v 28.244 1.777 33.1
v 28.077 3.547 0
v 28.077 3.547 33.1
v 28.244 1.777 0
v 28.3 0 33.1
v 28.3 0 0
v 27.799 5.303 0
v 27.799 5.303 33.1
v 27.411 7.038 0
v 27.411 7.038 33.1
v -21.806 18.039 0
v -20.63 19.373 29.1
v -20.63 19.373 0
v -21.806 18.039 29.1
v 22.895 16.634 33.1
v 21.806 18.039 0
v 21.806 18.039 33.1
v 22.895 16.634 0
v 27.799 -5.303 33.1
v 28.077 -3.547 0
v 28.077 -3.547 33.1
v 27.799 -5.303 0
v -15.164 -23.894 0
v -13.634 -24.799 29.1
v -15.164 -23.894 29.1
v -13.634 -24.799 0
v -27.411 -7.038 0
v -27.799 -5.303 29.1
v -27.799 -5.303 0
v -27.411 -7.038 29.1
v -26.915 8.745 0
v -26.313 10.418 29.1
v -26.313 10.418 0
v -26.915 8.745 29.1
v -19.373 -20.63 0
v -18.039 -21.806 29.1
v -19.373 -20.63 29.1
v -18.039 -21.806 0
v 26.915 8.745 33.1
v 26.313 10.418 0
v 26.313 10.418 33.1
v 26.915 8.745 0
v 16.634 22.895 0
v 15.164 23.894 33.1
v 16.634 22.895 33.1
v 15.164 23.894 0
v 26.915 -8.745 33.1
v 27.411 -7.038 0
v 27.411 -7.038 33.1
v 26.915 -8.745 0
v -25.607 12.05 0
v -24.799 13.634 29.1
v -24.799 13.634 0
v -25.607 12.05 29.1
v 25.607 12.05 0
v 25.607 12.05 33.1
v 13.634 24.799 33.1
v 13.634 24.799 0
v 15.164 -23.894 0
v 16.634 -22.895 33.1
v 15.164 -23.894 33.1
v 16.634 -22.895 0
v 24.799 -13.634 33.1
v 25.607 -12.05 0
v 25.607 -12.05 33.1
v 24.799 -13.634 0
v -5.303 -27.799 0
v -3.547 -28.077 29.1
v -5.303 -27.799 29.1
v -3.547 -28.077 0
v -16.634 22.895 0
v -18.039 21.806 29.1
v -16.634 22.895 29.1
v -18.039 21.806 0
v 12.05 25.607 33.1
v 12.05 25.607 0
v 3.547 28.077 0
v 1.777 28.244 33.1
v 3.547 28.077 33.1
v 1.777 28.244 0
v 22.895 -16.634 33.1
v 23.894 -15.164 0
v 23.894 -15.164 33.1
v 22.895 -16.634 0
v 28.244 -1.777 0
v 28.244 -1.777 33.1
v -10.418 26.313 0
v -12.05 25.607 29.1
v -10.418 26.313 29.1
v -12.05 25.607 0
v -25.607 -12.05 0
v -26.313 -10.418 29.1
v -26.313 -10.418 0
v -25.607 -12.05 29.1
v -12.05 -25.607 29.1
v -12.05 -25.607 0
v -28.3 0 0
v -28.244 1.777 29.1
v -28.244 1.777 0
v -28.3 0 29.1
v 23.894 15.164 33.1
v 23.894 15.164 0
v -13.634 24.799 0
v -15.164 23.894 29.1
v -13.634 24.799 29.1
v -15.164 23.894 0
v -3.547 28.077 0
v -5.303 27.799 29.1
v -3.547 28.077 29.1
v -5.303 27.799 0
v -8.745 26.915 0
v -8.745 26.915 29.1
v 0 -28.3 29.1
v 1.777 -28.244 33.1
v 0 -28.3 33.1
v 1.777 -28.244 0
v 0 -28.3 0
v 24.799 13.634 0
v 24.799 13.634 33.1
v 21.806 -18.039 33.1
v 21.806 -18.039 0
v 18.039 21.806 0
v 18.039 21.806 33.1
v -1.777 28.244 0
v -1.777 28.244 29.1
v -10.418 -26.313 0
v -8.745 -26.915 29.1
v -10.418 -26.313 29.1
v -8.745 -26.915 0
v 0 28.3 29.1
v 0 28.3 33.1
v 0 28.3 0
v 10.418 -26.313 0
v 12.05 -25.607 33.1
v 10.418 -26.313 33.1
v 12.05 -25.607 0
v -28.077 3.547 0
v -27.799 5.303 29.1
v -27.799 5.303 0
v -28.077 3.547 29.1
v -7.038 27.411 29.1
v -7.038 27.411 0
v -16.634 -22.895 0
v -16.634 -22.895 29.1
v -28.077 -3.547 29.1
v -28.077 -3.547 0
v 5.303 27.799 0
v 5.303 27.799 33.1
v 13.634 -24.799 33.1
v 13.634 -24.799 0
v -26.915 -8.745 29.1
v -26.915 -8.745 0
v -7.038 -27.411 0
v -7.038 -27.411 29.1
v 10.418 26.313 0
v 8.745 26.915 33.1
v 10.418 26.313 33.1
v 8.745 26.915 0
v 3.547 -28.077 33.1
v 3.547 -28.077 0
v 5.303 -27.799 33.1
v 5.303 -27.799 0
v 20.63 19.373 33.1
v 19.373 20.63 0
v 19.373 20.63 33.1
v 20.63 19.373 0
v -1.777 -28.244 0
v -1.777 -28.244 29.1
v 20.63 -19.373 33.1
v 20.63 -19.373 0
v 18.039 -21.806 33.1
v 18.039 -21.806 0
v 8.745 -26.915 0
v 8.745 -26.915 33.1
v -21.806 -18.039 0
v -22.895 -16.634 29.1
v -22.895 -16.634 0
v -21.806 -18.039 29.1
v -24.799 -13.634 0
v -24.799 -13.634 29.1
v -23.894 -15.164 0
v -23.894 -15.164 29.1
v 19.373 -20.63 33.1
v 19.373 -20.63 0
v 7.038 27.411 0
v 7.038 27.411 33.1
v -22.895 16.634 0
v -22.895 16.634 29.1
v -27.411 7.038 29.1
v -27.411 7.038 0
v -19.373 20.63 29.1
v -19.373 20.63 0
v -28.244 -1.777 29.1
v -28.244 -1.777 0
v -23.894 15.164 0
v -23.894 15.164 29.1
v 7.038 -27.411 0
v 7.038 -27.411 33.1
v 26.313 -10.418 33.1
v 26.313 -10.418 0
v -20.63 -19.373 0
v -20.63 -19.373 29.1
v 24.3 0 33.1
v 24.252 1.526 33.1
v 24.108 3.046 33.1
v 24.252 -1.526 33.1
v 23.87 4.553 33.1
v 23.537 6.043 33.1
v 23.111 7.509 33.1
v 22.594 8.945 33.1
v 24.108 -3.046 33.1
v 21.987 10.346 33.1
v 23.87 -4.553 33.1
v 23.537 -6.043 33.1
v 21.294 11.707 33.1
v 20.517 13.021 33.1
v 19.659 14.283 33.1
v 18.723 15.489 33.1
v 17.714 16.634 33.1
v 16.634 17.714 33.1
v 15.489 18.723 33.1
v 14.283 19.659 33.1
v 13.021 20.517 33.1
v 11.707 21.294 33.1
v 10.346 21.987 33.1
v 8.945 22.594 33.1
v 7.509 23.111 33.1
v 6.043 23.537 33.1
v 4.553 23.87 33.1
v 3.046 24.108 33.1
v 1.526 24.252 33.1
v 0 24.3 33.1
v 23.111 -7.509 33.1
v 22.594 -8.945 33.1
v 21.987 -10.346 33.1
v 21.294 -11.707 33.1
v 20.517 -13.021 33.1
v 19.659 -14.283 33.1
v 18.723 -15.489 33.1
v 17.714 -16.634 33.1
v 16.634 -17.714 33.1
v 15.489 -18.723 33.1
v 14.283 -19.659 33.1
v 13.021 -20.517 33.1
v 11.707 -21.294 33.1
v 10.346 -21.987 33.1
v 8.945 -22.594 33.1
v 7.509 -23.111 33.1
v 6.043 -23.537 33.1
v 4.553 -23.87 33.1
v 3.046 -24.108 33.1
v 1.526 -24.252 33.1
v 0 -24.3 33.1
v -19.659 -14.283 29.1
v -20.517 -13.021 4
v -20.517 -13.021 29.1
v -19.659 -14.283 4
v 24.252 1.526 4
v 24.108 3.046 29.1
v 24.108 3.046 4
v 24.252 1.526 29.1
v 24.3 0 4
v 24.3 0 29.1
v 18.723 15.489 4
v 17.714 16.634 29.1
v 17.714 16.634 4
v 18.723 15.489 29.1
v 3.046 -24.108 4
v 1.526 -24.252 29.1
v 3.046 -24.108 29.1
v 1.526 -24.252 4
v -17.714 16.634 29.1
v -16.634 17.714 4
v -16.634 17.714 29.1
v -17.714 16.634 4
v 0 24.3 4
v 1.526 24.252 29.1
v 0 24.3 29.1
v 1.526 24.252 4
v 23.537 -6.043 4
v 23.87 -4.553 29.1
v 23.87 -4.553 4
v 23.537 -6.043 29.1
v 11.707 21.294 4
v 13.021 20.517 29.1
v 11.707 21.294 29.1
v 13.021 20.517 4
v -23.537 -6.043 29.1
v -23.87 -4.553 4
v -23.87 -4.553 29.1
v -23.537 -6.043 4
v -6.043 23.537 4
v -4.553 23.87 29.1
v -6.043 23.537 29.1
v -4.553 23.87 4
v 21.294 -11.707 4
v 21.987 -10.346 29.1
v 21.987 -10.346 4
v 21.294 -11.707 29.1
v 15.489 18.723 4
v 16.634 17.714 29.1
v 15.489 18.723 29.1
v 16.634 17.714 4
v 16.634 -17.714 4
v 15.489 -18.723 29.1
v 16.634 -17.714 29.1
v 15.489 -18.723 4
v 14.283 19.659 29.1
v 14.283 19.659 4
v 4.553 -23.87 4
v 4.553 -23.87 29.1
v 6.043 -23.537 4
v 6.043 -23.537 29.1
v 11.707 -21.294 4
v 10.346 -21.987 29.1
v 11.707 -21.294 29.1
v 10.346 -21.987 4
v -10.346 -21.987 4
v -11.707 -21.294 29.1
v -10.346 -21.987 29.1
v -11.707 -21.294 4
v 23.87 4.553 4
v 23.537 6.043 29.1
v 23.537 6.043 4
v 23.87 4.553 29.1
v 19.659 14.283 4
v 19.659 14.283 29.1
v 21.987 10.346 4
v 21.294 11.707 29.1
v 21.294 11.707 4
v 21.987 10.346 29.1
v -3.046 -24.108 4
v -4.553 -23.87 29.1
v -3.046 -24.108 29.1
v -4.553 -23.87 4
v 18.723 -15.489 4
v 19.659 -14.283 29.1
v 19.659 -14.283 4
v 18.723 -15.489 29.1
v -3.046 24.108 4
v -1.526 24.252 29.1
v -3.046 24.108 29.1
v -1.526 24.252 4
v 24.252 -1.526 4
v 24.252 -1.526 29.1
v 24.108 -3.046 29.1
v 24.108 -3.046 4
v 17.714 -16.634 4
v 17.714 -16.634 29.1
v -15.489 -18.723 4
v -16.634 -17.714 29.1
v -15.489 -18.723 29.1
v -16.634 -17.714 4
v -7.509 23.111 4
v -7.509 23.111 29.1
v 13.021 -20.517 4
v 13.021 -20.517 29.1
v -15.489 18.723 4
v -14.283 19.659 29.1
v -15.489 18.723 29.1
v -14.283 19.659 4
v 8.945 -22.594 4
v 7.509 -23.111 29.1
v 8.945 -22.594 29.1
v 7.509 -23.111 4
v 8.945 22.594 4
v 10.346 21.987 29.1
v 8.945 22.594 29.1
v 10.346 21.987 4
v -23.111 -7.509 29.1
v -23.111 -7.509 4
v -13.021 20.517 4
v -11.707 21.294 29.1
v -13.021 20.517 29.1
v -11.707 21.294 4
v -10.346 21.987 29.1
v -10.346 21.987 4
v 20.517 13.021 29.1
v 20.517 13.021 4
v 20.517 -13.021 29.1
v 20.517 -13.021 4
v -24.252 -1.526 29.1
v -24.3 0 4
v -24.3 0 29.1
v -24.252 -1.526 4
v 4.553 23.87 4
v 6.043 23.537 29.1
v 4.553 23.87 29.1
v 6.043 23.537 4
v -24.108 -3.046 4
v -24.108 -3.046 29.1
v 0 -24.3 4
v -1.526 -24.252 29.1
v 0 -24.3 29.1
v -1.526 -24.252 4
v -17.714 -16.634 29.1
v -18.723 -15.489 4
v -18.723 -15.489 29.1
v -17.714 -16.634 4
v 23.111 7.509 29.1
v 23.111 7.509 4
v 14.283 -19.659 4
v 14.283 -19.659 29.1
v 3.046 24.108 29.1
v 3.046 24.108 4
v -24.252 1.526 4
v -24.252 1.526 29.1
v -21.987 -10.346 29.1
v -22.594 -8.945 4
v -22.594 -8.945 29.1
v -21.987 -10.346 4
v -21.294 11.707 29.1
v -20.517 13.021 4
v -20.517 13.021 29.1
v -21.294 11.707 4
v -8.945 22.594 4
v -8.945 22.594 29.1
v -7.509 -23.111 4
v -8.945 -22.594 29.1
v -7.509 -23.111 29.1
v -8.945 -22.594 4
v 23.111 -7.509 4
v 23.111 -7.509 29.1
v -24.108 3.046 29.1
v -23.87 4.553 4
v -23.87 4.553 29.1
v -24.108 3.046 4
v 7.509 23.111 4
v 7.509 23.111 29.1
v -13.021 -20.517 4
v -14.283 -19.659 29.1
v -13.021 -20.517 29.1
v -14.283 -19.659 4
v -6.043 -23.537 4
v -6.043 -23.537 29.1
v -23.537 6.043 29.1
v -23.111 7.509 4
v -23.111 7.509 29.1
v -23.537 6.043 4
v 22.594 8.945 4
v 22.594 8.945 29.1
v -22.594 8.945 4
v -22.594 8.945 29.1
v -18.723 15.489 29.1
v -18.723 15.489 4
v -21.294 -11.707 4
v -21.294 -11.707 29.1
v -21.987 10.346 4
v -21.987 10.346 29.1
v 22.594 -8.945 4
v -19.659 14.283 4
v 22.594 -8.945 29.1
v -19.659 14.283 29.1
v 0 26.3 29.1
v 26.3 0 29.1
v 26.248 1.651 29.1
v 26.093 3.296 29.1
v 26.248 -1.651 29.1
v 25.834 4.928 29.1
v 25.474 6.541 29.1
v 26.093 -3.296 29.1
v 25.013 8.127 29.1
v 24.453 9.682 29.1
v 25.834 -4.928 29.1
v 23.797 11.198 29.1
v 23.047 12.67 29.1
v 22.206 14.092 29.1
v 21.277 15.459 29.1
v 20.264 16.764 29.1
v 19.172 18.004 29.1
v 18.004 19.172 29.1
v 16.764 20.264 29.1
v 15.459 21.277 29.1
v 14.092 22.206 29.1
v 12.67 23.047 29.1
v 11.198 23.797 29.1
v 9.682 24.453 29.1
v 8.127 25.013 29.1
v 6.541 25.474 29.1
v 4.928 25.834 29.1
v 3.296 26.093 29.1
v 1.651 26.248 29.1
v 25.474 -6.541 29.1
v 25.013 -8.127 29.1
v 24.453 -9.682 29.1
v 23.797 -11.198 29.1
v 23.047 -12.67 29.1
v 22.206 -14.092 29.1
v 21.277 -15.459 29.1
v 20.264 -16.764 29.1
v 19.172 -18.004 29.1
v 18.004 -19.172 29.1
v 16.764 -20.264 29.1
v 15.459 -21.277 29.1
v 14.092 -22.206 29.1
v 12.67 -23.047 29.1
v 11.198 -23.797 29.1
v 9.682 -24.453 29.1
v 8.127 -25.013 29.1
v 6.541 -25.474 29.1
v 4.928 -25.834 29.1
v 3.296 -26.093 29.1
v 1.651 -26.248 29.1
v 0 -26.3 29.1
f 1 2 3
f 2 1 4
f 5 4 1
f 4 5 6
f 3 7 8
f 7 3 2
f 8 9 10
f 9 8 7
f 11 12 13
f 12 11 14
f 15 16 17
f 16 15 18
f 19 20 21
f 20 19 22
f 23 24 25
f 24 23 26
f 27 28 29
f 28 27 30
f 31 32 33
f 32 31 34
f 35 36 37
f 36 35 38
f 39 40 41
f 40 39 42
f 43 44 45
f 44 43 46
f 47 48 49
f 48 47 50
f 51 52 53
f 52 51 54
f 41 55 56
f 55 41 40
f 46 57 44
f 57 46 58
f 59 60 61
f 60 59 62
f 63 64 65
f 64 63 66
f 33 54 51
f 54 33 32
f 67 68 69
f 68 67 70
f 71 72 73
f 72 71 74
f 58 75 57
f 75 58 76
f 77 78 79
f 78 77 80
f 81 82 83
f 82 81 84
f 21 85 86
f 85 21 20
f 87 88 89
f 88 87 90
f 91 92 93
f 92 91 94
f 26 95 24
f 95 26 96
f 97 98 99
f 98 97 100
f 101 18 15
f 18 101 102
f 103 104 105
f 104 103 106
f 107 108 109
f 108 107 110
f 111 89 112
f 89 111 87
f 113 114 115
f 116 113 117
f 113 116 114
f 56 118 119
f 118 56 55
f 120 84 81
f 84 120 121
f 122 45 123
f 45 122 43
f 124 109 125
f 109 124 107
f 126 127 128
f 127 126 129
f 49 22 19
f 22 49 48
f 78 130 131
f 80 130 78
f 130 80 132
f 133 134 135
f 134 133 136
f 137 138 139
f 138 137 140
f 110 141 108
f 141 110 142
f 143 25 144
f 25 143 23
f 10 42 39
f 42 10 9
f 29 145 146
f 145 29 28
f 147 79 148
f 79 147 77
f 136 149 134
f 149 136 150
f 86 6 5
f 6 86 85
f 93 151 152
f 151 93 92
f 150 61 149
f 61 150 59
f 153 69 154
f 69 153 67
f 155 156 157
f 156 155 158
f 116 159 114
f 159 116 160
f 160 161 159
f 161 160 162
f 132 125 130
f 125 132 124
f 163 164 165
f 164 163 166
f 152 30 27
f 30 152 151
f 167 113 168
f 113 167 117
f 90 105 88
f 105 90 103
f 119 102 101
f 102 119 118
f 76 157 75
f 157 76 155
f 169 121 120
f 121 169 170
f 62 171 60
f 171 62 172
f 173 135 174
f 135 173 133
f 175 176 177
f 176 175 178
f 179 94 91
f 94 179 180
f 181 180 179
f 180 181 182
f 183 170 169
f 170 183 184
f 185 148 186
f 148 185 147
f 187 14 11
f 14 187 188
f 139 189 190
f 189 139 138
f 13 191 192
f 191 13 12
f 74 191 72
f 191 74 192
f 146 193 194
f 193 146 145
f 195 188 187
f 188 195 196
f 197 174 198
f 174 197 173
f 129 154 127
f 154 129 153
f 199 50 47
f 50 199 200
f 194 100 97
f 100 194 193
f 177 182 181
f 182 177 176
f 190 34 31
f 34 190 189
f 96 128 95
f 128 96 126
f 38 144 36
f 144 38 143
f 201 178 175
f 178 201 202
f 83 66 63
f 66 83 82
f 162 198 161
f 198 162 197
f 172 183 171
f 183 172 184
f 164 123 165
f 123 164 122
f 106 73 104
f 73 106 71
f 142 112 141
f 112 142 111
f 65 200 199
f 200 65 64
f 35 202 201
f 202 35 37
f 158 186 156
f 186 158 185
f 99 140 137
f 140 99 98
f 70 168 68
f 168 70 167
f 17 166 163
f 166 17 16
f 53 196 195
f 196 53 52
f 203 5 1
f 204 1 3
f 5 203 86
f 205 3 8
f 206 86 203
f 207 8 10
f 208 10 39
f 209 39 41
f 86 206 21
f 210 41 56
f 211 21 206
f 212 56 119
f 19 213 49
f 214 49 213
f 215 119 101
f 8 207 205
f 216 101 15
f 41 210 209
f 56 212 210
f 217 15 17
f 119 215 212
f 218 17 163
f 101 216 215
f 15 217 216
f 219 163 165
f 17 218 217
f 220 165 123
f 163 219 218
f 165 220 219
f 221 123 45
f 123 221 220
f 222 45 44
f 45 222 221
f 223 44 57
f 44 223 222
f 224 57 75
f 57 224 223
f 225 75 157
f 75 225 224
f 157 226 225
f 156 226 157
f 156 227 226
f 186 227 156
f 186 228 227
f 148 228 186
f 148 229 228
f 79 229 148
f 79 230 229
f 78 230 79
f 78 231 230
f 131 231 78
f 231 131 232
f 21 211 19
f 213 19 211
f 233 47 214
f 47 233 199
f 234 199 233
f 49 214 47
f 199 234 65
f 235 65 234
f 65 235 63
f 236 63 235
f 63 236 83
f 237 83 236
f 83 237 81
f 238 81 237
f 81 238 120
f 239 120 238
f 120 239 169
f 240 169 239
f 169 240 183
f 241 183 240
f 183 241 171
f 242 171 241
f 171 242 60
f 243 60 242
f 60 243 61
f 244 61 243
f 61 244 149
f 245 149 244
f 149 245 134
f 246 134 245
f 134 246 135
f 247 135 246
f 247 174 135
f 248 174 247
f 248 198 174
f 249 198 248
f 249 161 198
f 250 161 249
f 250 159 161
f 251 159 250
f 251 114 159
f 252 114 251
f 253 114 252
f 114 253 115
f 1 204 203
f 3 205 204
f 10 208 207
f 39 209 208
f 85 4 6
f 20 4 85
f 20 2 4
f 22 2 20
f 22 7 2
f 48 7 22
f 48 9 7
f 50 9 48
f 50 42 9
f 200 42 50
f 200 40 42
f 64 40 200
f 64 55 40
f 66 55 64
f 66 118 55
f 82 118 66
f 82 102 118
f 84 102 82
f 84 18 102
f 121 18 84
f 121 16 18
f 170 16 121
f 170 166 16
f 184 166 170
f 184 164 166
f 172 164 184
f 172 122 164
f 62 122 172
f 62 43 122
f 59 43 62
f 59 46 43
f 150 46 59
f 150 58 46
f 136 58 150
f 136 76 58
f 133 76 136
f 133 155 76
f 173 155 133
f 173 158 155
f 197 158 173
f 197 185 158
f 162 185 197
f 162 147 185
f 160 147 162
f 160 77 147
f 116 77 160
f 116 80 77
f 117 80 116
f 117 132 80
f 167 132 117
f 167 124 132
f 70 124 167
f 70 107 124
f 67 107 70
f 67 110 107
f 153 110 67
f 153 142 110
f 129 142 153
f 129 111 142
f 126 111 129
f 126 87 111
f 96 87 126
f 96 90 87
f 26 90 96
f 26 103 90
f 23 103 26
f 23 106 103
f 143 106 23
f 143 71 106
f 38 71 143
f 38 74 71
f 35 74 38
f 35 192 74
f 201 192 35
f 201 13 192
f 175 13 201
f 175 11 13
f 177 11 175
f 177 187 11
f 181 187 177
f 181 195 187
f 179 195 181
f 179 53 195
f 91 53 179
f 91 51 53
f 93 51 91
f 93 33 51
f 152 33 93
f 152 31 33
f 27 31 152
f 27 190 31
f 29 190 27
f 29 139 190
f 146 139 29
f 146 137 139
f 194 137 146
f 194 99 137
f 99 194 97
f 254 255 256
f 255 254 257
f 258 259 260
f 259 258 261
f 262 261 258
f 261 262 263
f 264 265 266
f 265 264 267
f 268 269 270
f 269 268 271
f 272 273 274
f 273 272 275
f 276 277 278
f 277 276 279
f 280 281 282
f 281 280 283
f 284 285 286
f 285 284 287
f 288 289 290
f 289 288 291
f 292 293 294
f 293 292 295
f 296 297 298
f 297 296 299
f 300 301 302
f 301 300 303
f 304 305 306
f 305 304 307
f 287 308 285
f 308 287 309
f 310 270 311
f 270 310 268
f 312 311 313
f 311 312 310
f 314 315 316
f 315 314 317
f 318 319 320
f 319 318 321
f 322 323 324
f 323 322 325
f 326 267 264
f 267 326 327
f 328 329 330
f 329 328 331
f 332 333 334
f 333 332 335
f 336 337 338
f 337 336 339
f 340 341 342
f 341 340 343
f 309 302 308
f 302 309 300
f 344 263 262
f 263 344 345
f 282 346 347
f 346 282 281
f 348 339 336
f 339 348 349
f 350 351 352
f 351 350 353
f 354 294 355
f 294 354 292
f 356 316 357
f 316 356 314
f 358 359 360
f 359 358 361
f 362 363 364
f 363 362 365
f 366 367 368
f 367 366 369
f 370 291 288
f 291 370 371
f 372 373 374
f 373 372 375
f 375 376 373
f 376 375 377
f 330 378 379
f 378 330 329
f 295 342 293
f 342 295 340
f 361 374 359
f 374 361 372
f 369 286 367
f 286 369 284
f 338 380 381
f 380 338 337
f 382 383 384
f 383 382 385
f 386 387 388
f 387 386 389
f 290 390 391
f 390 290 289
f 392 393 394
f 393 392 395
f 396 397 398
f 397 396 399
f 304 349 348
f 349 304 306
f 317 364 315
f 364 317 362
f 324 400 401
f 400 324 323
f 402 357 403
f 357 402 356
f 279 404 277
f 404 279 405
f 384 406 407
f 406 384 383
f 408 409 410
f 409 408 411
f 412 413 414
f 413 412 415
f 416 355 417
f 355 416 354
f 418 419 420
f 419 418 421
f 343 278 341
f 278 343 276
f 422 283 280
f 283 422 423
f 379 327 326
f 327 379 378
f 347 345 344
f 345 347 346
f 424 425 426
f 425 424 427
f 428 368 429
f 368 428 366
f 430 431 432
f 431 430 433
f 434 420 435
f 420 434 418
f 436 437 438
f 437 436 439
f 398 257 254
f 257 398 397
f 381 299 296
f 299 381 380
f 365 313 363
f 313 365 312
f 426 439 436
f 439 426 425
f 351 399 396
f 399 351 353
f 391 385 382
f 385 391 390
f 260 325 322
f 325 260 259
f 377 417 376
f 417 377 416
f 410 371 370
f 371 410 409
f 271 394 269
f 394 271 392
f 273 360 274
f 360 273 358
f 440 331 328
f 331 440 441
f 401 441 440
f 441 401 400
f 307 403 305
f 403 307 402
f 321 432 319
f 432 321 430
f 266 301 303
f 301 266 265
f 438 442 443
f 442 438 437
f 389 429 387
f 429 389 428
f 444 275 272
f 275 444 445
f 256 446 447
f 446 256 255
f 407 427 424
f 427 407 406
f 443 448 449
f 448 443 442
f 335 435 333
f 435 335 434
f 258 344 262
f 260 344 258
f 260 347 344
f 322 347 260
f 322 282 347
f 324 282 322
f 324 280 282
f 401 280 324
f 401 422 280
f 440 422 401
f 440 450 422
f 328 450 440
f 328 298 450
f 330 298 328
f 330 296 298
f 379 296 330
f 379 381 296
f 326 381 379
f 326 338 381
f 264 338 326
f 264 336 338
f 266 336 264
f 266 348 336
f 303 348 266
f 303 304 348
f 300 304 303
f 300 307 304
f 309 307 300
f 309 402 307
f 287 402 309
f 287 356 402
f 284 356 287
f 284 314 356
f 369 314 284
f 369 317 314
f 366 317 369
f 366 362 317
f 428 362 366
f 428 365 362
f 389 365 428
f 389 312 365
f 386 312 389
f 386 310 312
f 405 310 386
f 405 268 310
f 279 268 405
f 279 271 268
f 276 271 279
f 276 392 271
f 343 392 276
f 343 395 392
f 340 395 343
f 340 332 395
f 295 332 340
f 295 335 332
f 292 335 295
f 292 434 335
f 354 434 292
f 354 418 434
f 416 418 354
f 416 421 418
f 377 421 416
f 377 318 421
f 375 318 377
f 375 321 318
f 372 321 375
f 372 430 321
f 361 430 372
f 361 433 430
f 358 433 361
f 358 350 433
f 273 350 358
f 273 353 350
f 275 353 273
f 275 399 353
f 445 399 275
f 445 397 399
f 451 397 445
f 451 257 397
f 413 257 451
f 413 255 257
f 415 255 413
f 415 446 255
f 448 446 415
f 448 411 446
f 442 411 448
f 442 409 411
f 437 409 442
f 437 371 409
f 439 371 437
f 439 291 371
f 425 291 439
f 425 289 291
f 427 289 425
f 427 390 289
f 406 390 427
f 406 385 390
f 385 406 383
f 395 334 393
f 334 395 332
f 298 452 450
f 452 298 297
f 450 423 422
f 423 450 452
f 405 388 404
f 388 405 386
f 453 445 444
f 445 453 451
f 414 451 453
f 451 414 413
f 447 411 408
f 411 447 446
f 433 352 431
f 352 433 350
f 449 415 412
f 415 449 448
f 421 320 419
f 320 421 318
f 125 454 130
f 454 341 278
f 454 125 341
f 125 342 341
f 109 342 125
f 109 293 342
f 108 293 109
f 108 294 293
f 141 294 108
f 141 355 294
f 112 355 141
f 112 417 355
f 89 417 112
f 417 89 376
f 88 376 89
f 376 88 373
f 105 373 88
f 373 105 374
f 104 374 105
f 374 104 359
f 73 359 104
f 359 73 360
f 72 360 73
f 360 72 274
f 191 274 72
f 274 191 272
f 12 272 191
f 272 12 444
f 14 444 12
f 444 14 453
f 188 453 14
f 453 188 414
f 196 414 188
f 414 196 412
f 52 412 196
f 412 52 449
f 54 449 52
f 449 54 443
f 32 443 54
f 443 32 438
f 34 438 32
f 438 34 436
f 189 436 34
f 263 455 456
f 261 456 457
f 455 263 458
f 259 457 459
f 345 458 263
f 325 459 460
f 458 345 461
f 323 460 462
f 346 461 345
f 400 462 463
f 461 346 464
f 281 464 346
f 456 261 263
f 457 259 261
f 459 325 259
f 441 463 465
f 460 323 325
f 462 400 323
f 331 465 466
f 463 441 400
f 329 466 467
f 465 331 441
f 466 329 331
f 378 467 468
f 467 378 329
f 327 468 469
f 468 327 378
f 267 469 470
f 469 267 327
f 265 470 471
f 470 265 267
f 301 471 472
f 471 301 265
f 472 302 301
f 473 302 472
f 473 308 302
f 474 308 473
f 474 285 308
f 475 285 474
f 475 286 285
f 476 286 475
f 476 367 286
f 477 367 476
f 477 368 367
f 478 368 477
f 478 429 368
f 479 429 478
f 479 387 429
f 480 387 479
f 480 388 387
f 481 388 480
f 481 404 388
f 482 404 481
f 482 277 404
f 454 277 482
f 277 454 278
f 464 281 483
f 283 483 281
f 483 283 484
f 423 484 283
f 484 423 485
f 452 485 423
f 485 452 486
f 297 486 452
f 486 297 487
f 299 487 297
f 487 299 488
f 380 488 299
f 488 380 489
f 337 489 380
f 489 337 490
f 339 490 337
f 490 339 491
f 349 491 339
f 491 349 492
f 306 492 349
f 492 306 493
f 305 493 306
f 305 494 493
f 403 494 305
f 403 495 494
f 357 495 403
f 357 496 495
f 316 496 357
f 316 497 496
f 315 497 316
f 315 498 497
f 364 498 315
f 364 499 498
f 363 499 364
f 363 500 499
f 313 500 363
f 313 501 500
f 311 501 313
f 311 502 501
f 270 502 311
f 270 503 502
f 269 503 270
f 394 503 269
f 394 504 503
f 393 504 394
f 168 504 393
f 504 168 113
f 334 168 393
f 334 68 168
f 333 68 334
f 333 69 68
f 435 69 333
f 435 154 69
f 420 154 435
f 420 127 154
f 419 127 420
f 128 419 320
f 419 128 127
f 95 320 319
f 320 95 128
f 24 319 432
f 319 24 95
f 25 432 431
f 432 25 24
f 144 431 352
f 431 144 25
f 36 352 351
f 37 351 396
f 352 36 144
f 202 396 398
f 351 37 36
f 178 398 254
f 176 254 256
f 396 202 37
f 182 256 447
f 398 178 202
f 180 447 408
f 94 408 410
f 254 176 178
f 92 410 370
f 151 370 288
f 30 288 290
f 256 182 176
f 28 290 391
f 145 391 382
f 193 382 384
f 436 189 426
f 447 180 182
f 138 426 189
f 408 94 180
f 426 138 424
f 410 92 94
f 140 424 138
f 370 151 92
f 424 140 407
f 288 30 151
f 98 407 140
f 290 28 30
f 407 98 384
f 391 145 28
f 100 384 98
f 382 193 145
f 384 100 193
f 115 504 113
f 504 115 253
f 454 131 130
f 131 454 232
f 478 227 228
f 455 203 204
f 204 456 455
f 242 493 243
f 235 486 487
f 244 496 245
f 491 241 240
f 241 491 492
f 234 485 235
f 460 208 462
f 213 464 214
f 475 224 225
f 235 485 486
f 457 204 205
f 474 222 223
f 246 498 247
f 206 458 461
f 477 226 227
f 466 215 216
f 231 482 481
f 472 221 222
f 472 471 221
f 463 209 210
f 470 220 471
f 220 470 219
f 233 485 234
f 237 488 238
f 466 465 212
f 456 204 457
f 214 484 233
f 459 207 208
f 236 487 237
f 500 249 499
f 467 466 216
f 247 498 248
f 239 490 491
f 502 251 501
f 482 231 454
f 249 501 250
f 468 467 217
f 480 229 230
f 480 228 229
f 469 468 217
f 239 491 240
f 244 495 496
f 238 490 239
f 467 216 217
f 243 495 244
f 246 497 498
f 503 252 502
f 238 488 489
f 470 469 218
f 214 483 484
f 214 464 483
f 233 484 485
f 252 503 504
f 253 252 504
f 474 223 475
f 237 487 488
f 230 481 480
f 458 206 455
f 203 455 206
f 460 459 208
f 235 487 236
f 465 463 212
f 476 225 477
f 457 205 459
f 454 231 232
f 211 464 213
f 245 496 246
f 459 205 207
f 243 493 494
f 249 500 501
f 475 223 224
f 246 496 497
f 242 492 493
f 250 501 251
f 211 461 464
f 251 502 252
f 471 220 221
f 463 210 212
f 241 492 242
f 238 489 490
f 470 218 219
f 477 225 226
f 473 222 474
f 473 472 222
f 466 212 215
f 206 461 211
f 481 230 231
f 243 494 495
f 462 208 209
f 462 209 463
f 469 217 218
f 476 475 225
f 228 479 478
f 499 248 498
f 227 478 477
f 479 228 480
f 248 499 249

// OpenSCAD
$fn=100;

t = 0.6;
dia = 48 + t;
h = 24.5 + t;
wall = 4;

rad = dia/2;
lid_w = rad + (wall/2);
rerr = 0.01;

full_r = rad + wall;

// # translate([0, 0, wall])
// cylinder(r=(dia-t)/2, h=h-t);

module bowl() {
  difference() {
    cylinder(r=full_r, h=h + (wall*2));

    translate([0, 0, wall])
    cylinder(r=rad, h=h + (wall*2));
  }
}


module disc() {
  difference() {
    cylinder(r1=full_r, r2=full_r, h=wall);

    translate([0, -full_r, -rerr])
    cube([full_r, full_r*2.5, full_r]);
  }
}

difference() {
  bowl();

  translate([0, 0, h+wall]) {
    disc();

    cylinder(r1=lid_w, r2=rad, h=wall);
  }
}

// translate([-full_r*2, 0, 0]) {
//   difference() {
//     union() {
//       disc();
//
//       scale([1/lid_w * (lid_w-0.3), 1/lid_w * (lid_w-0.3), 1zc])
//       cylinder(r1=lid_w, r2=rad, h=wall);
//     }
//
//     translate([0, 0, 4])
//     scale([1, 0.5, 0.2])
//     sphere(r=25/2);
//   }
// }
